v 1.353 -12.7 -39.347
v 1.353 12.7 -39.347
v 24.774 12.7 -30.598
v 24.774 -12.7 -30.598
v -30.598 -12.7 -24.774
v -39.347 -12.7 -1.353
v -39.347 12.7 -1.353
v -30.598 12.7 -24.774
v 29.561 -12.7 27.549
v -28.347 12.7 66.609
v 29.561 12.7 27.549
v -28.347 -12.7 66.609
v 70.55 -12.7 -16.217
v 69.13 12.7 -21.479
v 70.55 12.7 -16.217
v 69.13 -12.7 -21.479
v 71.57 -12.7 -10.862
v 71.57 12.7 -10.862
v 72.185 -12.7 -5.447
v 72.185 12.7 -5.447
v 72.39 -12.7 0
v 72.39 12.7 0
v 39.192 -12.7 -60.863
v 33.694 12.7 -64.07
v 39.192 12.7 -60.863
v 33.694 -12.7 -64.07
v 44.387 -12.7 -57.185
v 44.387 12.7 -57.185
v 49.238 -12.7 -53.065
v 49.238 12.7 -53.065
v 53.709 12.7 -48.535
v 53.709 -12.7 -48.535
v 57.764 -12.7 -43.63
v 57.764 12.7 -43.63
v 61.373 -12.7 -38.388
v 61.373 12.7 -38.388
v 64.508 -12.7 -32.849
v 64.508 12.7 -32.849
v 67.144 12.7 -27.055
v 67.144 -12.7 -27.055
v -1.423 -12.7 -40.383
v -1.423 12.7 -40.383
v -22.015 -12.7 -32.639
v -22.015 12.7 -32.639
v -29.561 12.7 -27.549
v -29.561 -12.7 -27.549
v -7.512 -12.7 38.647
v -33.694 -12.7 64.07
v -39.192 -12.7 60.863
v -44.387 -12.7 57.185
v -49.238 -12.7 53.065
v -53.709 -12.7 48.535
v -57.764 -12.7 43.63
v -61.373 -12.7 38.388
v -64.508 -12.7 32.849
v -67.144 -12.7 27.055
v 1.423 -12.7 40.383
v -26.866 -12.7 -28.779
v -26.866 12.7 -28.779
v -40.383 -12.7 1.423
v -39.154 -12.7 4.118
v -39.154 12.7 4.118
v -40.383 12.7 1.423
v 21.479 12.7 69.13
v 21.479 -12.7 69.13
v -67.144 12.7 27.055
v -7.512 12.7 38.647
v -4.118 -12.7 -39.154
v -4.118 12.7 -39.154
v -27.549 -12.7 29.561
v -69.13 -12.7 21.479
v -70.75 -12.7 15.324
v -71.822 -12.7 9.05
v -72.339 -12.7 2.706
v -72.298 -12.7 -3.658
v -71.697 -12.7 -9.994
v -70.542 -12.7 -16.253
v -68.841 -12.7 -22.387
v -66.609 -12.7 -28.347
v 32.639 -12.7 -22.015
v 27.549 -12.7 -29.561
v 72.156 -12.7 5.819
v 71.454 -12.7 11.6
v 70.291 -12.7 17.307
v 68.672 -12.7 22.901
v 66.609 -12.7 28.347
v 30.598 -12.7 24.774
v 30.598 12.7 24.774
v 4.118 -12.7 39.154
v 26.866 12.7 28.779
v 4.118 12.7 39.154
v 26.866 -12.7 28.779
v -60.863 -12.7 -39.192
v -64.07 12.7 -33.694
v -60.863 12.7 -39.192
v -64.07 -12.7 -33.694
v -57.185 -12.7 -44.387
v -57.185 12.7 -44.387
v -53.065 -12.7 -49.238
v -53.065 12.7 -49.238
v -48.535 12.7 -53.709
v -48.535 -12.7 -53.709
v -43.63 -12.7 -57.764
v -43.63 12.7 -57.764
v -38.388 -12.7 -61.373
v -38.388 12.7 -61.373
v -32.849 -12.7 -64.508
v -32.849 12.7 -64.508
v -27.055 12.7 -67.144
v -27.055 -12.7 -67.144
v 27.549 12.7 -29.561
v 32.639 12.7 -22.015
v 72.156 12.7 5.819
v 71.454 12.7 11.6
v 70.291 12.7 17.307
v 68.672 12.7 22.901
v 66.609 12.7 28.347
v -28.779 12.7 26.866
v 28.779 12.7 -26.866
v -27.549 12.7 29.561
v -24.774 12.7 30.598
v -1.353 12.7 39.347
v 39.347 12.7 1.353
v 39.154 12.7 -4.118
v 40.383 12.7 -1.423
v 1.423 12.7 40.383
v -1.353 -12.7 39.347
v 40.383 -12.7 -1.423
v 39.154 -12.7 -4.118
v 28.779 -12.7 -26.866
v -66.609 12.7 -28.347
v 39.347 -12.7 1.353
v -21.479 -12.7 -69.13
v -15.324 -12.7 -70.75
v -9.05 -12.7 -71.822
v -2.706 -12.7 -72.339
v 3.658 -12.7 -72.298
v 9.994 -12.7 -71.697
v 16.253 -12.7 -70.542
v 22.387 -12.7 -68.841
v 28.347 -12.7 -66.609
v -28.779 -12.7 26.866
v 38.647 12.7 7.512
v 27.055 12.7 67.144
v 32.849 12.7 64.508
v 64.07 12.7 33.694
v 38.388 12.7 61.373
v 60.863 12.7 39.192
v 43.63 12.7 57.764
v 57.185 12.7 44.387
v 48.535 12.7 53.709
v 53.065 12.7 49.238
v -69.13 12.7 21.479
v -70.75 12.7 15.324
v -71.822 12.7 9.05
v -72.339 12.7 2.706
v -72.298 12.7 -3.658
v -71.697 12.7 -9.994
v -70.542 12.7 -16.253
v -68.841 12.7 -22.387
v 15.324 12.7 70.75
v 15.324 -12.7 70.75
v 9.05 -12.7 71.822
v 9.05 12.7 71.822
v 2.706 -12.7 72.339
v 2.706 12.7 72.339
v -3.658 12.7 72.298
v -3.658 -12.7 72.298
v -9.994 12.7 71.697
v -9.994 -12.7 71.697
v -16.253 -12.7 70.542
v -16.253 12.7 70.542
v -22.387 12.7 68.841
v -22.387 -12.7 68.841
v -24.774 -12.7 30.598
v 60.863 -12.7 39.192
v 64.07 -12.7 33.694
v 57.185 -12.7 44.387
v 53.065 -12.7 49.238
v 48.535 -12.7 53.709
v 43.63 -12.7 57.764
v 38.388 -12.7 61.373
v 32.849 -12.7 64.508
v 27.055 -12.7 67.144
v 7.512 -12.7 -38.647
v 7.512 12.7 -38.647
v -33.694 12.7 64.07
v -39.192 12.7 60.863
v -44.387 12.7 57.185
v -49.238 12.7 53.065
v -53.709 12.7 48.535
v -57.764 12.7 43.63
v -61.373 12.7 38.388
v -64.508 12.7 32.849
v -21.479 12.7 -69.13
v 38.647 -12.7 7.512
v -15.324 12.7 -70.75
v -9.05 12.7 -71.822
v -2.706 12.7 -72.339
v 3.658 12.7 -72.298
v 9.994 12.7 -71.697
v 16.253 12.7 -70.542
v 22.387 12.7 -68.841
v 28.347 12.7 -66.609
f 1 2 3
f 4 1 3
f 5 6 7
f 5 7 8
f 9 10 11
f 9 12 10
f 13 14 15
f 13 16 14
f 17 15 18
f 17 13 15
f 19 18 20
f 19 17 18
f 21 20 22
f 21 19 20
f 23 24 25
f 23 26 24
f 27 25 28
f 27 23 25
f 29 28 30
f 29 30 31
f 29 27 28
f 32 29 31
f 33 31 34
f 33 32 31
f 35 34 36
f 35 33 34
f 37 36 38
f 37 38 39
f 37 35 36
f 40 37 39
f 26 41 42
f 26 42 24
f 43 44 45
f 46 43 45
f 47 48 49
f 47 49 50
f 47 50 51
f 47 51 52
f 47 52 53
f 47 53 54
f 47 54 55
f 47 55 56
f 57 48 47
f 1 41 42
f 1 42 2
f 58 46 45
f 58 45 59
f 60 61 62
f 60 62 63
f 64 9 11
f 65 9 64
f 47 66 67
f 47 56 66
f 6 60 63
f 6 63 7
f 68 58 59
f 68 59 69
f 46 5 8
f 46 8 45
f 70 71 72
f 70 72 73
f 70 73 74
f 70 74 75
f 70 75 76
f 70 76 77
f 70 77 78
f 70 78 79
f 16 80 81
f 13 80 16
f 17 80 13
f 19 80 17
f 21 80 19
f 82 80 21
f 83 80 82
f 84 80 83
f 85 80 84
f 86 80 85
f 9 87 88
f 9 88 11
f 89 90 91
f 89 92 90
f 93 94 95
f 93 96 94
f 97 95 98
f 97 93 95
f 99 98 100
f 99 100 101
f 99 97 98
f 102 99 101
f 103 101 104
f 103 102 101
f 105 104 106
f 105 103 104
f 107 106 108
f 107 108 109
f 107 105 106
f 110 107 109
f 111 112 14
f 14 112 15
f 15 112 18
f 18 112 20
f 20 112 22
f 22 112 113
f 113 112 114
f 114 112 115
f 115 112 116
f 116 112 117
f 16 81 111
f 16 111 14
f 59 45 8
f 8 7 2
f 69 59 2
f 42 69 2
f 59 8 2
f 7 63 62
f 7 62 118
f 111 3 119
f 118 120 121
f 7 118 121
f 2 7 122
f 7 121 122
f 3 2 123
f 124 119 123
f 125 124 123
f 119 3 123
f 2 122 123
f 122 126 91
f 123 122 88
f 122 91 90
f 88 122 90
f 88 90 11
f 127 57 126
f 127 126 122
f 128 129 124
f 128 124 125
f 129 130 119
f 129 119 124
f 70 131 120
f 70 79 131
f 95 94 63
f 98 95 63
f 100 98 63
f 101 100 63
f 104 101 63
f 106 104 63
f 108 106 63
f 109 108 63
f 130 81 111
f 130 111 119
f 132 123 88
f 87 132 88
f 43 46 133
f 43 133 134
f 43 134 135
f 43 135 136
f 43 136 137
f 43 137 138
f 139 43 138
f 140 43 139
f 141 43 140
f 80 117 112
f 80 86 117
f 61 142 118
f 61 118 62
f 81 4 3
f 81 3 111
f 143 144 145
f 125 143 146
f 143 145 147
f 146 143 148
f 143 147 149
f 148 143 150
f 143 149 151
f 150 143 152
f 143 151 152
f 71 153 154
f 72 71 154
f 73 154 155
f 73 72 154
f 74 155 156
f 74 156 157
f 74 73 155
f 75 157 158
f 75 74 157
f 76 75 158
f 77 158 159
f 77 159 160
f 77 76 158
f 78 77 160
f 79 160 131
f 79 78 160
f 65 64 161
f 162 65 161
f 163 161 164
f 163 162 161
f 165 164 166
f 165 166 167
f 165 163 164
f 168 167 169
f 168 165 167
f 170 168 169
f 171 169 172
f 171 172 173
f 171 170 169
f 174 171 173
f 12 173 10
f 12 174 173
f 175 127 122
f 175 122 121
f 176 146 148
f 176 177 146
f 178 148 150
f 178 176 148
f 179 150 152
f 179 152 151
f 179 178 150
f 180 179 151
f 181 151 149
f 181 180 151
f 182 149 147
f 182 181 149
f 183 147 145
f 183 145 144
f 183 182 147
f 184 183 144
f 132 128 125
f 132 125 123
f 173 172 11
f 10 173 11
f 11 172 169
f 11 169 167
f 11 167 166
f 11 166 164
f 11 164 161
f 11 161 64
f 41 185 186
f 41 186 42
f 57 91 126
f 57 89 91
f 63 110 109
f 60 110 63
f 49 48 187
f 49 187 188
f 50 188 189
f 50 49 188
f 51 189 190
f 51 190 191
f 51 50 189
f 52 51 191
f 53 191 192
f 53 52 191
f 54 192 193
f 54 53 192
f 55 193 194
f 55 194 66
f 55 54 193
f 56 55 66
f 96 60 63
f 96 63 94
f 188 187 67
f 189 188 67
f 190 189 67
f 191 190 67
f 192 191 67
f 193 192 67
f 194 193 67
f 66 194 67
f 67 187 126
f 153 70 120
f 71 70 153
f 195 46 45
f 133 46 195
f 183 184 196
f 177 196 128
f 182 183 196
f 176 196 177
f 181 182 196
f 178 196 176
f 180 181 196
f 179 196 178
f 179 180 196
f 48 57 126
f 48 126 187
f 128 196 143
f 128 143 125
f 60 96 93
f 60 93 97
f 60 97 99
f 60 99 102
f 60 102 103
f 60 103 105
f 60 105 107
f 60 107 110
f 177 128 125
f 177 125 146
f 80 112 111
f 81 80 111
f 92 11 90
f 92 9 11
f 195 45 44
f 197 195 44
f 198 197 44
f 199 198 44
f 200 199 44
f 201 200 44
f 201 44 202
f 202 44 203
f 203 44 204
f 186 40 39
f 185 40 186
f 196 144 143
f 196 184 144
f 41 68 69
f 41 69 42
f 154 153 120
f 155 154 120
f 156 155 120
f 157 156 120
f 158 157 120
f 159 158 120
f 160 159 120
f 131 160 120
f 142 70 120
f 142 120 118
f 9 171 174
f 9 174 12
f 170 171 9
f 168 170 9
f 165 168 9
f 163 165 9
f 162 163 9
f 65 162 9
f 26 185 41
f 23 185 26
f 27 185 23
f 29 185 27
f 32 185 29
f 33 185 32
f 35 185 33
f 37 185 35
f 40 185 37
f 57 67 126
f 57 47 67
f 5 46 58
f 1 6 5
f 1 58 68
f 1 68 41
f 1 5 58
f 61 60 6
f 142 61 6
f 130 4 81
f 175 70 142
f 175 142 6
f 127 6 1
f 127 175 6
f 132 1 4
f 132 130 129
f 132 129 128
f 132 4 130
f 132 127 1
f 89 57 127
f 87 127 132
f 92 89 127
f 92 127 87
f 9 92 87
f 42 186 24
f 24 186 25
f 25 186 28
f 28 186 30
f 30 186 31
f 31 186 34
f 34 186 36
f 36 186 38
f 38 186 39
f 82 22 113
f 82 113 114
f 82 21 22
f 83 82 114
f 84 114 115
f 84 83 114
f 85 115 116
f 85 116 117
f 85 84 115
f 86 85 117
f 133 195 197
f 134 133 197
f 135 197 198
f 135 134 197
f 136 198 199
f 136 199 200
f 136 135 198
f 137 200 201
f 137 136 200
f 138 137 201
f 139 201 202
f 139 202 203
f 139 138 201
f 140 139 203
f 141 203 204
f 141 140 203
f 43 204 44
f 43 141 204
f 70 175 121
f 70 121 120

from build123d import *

# Parameters (mm, degrees)
F1_DEPTH = 12.7
F2_DEPTH = 12.7


with BuildPart() as f1:
    # F0 (on Front) → F1 (new body, symmetric)
    with BuildSketch(Plane.XZ):
        with BuildLine():
            Line((-7.5121501428, 38.6466622133), (1.42265525, 40.3834124477))
            Line((1.42265525, 40.3834124477), (-33.6944872903, 64.0702241782))
            ThreePointArc((-33.6944872903, 64.0702241782), (-53.7087007187, 48.5354258981), (-67.1440035139, 27.0554041206))
            Line((-67.1440035139, 27.0554041206), (-7.5121501428, 38.6466622133))
        make_face()
    extrude(amount=F1_DEPTH, both=True)


with BuildPart() as f1b:
    # F0 (on Front) → F1, piece 2 (new body, symmetric)
    with BuildSketch(Plane.XZ):
        with BuildLine():
            Line((22.0154242614, 32.6392094664), (29.5613539637, 27.5494156147))
            Line((29.5613539637, 27.5494156147), (21.478889537, 69.1300904401))
            ThreePointArc((21.478889537, 69.1300904401), (-3.6580577065, 72.2975152672), (-28.3469204792, 66.6090399221))
            Line((-28.3469204792, 66.6090399221), (22.0154242614, 32.6392094664))
        make_face()
    extrude(amount=F1_DEPTH, both=True)


with BuildPart() as f1c:
    # F0 (on Front) → F1, piece 3 (new body, symmetric)
    with BuildSketch(Plane.XZ):
        with BuildLine():
            Line((27.0554041206, 67.1440035139), (38.6466622299, 7.5121500575))
            Line((38.6466622299, 7.5121500575), (40.3834124477, -1.42265525))
            Line((40.3834124477, -1.42265525), (64.0702241782, 33.6944872903))
            ThreePointArc((64.0702241782, 33.6944872903), (48.5354258981, 53.7087007187), (27.0554041206, 67.1440035139))
        make_face()
    extrude(amount=F1_DEPTH, both=True)


with BuildPart() as f1d:
    # F0 (on Front) → F1, piece 4 (new body, symmetric)
    with BuildSketch(Plane.XZ):
        with BuildLine():
            Line((66.6090399221, 28.3469204792), (32.639209035, -22.0154249009))
            Line((32.639209035, -22.0154249009), (27.5494156147, -29.5613539637))
            Line((27.5494156147, -29.5613539637), (69.1300904401, -21.478889537))
            ThreePointArc((69.1300904401, -21.478889537), (71.5703826557, -10.862431888), (72.39, 0))
            ThreePointArc((72.39, 0), (70.9300377131, 14.4651944342), (66.6090399221, 28.3469204792))
        make_face()
    extrude(amount=F1_DEPTH, both=True)


with BuildPart() as f1e:
    # F0 (on Front) → F1, piece 5 (new body, symmetric)
    with BuildSketch(Plane.XZ):
        with BuildLine():
            Line((67.1440035139, -27.0554041206), (7.5121503146, -38.64666218))
            Line((7.5121503146, -38.64666218), (-1.42265525, -40.3834124477))
            Line((-1.42265525, -40.3834124477), (33.6944872903, -64.0702241782))
            ThreePointArc((33.6944872903, -64.0702241782), (53.7087007187, -48.5354258981), (67.1440035139, -27.0554041206))
        make_face()
    extrude(amount=F1_DEPTH, both=True)


with BuildPart() as f1f:
    # F0 (on Front) → F1, piece 6 (new body, symmetric)
    with BuildSketch(Plane.XZ):
        with BuildLine():
            Line((28.3469204792, -66.6090399221), (-22.0154245187, -32.6392092929))
            Line((-22.0154245187, -32.6392092929), (-29.5613539637, -27.5494156147))
            Line((-29.5613539637, -27.5494156147), (-21.478889537, -69.1300904401))
            ThreePointArc((-21.478889537, -69.1300904401), (3.6580577065, -72.2975152672), (28.3469204792, -66.6090399221))
        make_face()
    extrude(amount=F1_DEPTH, both=True)


with BuildPart() as f1g:
    # F0 (on Front) → F1, piece 7 (new body, symmetric)
    with BuildSketch(Plane.XZ):
        with BuildLine():
            Line((-27.0554041206, -67.1440035139), (-38.6466621547, -7.5121504446))
            Line((-38.6466621547, -7.5121504446), (-40.3834124477, 1.42265525))
            Line((-40.3834124477, 1.42265525), (-64.0702241782, -33.6944872903))
            ThreePointArc((-64.0702241782, -33.6944872903), (-48.5354258981, -53.7087007187), (-27.0554041206, -67.1440035139))
        make_face()
    extrude(amount=F1_DEPTH, both=True)


with BuildPart() as f1h:
    # F0 (on Front) → F1, piece 8 (new body, symmetric)
    with BuildSketch(Plane.XZ):
        with BuildLine():
            Line((-32.6392092281, 22.0154246147), (-27.5494156147, 29.5613539637))
            Line((-27.5494156147, 29.5613539637), (-69.1300904401, 21.478889537))
            ThreePointArc((-69.1300904401, 21.478889537), (-72.2975152672, -3.6580577065), (-66.6090399221, -28.3469204792))
            Line((-66.6090399221, -28.3469204792), (-32.6392092281, 22.0154246147))
        make_face()
    extrude(amount=F1_DEPTH, both=True)


with BuildPart() as f2:
    # F0 (on Front) → F2 (new body, symmetric)
    with BuildSketch(Plane.XZ):
        with BuildLine():
            ThreePointArc((-1.3526049363, 39.3467579336), (1.3860941963, 39.34559242), (4.1180859838, 39.1540325871))
            Line((4.1180859838, 39.1540325871), (1.42265525, 40.3834124477))
            Line((1.42265525, 40.3834124477), (-1.3526049363, 39.3467579336))
        make_face()
        with BuildLine():
            ThreePointArc((-28.7787954753, 26.8659232299), (-26.8414186044, 28.8016518155), (-24.7741554285, 30.5980084778))
            Line((-24.7741554285, 30.5980084778), (-27.5494156147, 29.5613539637))
            Line((-27.5494156147, 29.5613539637), (-28.7787954753, 26.8659232299))
        make_face()
        with BuildLine():
            ThreePointArc((-39.3467579336, -1.3526049363), (-39.34559242, 1.3860941963), (-39.1540325871, 4.1180859838))
            Line((-39.1540325871, 4.1180859838), (-40.3834124477, 1.42265525))
            Line((-40.3834124477, 1.42265525), (-39.3467579336, -1.3526049363))
        make_face()
        with BuildLine():
            ThreePointArc((26.8659232299, 28.7787954753), (28.8016518155, 26.8414186044), (30.5980084778, 24.7741554285))
            Line((30.5980084778, 24.7741554285), (29.5613539637, 27.5494156147))
            Line((29.5613539637, 27.5494156147), (26.8659232299, 28.7787954753))
        make_face()
        with BuildLine():
            ThreePointArc((39.3467579336, 1.3526049363), (39.3641890546, 0.676402304), (39.37, 0))
            ThreePointArc((39.37, 0), (39.3159710738, -2.0618725769), (39.1540325871, -4.1180859838))
            Line((39.1540325871, -4.1180859838), (40.3834124477, -1.42265525))
            Line((40.3834124477, -1.42265525), (39.3467579336, 1.3526049363))
        make_face()
        with BuildLine():
            Line((27.5494156147, -29.5613539637), (28.7787954753, -26.8659232299))
            ThreePointArc((28.7787954753, -26.8659232299), (26.8414186044, -28.8016518155), (24.7741554285, -30.5980084778))
            Line((24.7741554285, -30.5980084778), (27.5494156147, -29.5613539637))
        make_face()
        with BuildLine():
            Line((-1.42265525, -40.3834124477), (1.3526049363, -39.3467579336))
            ThreePointArc((1.3526049363, -39.3467579336), (-1.3860941963, -39.34559242), (-4.1180859838, -39.1540325871))
            Line((-4.1180859838, -39.1540325871), (-1.42265525, -40.3834124477))
        make_face()
        with BuildLine():
            ThreePointArc((39.1540325871, -4.1180859838), (39.3159710738, -2.0618725769), (39.37, 0))
            ThreePointArc((39.37, 0), (39.3641890546, 0.676402304), (39.3467579336, 1.3526049363))
            Line((39.3467579336, 1.3526049363), (30.5980084778, 24.7741554285))
            ThreePointArc((30.5980084778, 24.7741554285), (28.8016518155, 26.8414186044), (26.8659232299, 28.7787954753))
            Line((26.8659232299, 28.7787954753), (4.1180859838, 39.1540325871))
            ThreePointArc((4.1180859838, 39.1540325871), (1.3860941963, 39.34559242), (-1.3526049363, 39.3467579336))
            Line((-1.3526049363, 39.3467579336), (-24.7741554285, 30.5980084778))
            ThreePointArc((-24.7741554285, 30.5980084778), (-26.8414186044, 28.8016518155), (-28.7787954753, 26.8659232299))
            Line((-28.7787954753, 26.8659232299), (-39.1540325871, 4.1180859838))
            ThreePointArc((-39.1540325871, 4.1180859838), (-39.34559242, 1.3860941963), (-39.3467579336, -1.3526049363))
            Line((-39.3467579336, -1.3526049363), (-30.5980084778, -24.7741554285))
            ThreePointArc((-30.5980084778, -24.7741554285), (-28.8016518155, -26.8414186044), (-26.8659232299, -28.7787954753))
            Line((-26.8659232299, -28.7787954753), (-4.1180859838, -39.1540325871))
            ThreePointArc((-4.1180859838, -39.1540325871), (-1.3860941963, -39.34559242), (1.3526049363, -39.3467579336))
            Line((1.3526049363, -39.3467579336), (24.7741554285, -30.5980084778))
            ThreePointArc((24.7741554285, -30.5980084778), (26.8414186044, -28.8016518155), (28.7787954753, -26.8659232299))
            Line((28.7787954753, -26.8659232299), (39.1540325871, -4.1180859838))
        make_face()
        with BuildLine():
            Line((-29.5613539637, -27.5494156147), (-26.8659232299, -28.7787954753))
            ThreePointArc((-26.8659232299, -28.7787954753), (-28.8016518155, -26.8414186044), (-30.5980084778, -24.7741554285))
            Line((-30.5980084778, -24.7741554285), (-29.5613539637, -27.5494156147))
        make_face()
    extrude(amount=F2_DEPTH, both=True)


solid = Compound([f1.part, f1b.part, f1c.part, f1d.part, f1e.part, f1f.part, f1g.part, f1h.part, f2.part])
